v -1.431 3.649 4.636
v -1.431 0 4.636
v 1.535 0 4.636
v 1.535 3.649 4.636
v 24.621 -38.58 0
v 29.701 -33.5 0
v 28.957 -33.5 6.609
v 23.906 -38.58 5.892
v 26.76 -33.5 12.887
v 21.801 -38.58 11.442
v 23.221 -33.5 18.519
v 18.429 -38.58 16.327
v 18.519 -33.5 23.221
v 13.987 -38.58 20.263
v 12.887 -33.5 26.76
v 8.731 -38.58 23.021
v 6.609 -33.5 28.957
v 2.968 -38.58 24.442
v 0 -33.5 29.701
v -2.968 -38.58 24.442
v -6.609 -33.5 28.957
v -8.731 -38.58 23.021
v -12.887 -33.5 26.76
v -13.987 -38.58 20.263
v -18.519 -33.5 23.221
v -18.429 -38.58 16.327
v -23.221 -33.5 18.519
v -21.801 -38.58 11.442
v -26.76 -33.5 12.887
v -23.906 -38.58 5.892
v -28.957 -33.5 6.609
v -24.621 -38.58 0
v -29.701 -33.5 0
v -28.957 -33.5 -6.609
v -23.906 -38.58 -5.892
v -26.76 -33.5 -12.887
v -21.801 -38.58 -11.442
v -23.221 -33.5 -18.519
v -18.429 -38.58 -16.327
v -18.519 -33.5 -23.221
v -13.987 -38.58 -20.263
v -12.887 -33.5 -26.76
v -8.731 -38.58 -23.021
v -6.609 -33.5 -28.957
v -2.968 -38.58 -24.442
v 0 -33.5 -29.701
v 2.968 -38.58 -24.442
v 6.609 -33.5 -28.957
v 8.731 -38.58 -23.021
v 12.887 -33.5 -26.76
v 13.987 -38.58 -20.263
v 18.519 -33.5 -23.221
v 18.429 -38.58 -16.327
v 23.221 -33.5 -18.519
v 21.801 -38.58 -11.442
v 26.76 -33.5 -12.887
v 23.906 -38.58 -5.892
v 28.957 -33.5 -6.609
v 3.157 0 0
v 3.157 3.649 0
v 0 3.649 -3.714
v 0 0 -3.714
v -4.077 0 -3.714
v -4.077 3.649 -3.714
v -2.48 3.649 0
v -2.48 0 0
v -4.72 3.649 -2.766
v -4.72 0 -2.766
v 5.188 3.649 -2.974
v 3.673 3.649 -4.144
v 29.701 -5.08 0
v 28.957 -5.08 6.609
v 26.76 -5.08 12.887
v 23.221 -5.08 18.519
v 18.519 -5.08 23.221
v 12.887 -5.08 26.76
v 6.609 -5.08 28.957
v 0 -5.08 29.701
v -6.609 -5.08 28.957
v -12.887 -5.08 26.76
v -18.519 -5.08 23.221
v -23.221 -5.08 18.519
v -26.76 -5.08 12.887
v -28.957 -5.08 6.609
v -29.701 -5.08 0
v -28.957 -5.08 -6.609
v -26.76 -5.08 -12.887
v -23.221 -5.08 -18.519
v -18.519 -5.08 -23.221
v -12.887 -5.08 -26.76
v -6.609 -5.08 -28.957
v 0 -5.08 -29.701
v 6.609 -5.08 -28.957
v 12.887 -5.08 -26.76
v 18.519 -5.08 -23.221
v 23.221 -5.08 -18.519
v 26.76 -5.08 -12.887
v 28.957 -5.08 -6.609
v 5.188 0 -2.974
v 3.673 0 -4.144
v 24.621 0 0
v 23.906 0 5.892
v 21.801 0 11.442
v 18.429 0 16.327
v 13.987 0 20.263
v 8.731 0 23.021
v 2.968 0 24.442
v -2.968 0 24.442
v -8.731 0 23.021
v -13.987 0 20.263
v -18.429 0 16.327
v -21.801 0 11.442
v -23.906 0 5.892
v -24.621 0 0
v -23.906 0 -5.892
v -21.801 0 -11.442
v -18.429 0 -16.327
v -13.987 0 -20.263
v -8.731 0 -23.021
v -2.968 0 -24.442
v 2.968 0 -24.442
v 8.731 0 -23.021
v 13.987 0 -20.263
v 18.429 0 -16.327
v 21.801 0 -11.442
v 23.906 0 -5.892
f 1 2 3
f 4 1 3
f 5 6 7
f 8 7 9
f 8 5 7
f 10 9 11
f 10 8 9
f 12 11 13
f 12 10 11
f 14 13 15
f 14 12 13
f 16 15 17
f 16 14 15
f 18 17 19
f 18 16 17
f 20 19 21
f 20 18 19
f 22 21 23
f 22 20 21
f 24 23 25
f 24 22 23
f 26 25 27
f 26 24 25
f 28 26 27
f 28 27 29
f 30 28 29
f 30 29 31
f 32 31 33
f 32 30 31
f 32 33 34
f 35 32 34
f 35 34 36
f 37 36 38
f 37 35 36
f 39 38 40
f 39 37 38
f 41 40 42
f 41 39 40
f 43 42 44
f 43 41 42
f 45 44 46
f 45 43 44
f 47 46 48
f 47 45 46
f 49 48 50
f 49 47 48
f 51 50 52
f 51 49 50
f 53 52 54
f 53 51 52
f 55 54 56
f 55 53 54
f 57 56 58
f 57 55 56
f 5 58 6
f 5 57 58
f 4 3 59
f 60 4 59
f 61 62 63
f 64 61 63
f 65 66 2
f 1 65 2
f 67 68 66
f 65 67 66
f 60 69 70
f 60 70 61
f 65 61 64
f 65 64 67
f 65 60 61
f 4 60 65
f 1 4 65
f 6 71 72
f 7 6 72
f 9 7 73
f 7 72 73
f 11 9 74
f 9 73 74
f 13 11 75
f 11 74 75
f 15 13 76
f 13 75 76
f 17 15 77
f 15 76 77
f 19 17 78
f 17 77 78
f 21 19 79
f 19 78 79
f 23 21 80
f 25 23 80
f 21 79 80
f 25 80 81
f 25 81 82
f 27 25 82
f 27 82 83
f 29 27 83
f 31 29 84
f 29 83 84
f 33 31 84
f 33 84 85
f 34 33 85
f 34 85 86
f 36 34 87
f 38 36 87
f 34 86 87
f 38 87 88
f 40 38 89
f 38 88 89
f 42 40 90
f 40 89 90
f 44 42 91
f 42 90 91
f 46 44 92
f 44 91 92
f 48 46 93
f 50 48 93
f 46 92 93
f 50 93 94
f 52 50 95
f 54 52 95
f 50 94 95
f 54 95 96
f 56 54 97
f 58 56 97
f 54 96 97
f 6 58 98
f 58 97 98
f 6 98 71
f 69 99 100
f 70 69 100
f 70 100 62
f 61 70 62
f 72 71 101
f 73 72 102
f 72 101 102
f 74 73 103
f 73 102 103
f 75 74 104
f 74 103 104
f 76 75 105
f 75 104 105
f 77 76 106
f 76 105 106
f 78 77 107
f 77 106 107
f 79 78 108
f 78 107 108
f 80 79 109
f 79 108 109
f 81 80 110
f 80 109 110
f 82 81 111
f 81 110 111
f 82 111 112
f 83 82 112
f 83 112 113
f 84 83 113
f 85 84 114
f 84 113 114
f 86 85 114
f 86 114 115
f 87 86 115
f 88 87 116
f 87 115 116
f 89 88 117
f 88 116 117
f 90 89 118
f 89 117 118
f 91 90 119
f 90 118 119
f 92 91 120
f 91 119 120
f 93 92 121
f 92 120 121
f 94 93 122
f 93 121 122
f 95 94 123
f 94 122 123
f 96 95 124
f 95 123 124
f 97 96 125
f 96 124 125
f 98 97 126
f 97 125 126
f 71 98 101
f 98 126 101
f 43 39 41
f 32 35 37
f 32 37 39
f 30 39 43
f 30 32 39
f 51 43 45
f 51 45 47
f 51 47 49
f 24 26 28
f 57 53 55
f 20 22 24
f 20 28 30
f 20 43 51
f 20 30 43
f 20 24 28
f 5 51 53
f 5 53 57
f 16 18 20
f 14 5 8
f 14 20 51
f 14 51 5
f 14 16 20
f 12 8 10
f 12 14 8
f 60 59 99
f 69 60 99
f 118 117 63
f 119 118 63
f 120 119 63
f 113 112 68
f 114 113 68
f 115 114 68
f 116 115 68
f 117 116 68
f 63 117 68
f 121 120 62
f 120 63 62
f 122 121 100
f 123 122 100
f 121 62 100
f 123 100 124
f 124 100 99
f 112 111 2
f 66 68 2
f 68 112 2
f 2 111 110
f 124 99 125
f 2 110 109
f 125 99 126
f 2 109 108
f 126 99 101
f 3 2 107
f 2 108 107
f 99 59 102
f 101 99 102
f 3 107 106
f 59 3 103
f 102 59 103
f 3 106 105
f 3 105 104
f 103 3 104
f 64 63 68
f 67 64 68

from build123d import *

# Parameters (mm, degrees)
F0_R     = 29.7013874084
F2_DEPTH = 38.5799203068
F1_SIZE  = 5.08
F3_R     = 20.8700317212
F3_R_2   = 17.605389727
F4_DEPTH = 28.3505246043
F6_DEPTH = 3.6485241726


with BuildPart() as f2:
    # F0 (on Front) → F2 (new body)
    with BuildSketch(Plane.XZ):
        Circle(F0_R)
    extrude(amount=F2_DEPTH)

    # F1
    f1_edges = [f2.edges().sort_by_distance(p)[0] for p in [
        (29.701387, -19.28996, 0),
        (-29.701387, 0, 0),
        (-29.701387, -38.57992, 0),
    ]]
    chamfer(f1_edges, length=F1_SIZE)

    # F3 (on face) → F4 (join)
    with BuildSketch(Plane.XZ.offset(38.5799203068)):
        Circle(F3_R)
        Circle(F3_R_2, mode=Mode.SUBTRACT)
    extrude(amount=-F4_DEPTH)

    # F5 (on face) → F6 (join)
    with BuildSketch(Plane(origin=(0, 0, 0), x_dir=(-1, 0, 0), z_dir=(0, 1, 0))):
        Polygon((-3.1568305567, 0), (-2.227387391, 0), (2.480414696, 0), (1.4310600236, 4.6359952539), (-1.5352480114, 4.6359952539), align=None)
        Polygon((2.480414696, 0), (-2.227387391, 0), (-3.1568305567, 0), (0, -3.7142876536), align=None)
        Polygon((4.7204634175, -2.7660680935), (2.480414696, 0), (0, -3.7142876536), (4.0771467611, -3.7142876536), align=None)
        Polygon((0, -3.7142876536), (-3.1568305567, 0), (-5.1875901408, -2.9743975028), (-3.672990948, -4.144215025), align=None)
    extrude(amount=F6_DEPTH)


solid = f2.part
